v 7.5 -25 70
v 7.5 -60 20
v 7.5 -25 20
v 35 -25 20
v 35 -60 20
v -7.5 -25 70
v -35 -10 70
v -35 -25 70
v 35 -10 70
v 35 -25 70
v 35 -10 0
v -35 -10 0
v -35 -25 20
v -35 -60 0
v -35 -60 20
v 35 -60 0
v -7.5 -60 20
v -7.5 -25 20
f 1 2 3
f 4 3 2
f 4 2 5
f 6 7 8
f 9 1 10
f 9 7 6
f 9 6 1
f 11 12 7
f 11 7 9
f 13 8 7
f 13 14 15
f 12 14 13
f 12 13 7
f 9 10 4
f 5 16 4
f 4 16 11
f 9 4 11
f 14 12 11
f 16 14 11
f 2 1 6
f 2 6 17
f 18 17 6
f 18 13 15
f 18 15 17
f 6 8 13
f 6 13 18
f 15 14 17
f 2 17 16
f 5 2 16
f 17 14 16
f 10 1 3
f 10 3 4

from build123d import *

# Parameters (mm, degrees)
F0_W     = 70
F0_H     = 35
F1_DEPTH = 20
F0_H_2   = 15
F2_DEPTH = 70
F4_DEPTH = 7.5


with BuildPart() as f1:
    # F0 (on Top) → F1 (new body)
    with BuildSketch(Plane.XY):
        with Locations((0, -42.5)):
            Rectangle(F0_W, F0_H)
    extrude(amount=F1_DEPTH)

    # F0 (on Top) → F2 (join)
    with BuildSketch(Plane.XY):
        with Locations((0, -17.5)):
            Rectangle(F0_W, F0_H_2)
    extrude(amount=F2_DEPTH)

    # F3 (on Right) → F4 (join, symmetric)
    with BuildSketch(Plane.YZ):
        Polygon((-25, 20), (-25, 70), (-60, 20), align=None)
    extrude(amount=F4_DEPTH, both=True)


solid = f1.part
